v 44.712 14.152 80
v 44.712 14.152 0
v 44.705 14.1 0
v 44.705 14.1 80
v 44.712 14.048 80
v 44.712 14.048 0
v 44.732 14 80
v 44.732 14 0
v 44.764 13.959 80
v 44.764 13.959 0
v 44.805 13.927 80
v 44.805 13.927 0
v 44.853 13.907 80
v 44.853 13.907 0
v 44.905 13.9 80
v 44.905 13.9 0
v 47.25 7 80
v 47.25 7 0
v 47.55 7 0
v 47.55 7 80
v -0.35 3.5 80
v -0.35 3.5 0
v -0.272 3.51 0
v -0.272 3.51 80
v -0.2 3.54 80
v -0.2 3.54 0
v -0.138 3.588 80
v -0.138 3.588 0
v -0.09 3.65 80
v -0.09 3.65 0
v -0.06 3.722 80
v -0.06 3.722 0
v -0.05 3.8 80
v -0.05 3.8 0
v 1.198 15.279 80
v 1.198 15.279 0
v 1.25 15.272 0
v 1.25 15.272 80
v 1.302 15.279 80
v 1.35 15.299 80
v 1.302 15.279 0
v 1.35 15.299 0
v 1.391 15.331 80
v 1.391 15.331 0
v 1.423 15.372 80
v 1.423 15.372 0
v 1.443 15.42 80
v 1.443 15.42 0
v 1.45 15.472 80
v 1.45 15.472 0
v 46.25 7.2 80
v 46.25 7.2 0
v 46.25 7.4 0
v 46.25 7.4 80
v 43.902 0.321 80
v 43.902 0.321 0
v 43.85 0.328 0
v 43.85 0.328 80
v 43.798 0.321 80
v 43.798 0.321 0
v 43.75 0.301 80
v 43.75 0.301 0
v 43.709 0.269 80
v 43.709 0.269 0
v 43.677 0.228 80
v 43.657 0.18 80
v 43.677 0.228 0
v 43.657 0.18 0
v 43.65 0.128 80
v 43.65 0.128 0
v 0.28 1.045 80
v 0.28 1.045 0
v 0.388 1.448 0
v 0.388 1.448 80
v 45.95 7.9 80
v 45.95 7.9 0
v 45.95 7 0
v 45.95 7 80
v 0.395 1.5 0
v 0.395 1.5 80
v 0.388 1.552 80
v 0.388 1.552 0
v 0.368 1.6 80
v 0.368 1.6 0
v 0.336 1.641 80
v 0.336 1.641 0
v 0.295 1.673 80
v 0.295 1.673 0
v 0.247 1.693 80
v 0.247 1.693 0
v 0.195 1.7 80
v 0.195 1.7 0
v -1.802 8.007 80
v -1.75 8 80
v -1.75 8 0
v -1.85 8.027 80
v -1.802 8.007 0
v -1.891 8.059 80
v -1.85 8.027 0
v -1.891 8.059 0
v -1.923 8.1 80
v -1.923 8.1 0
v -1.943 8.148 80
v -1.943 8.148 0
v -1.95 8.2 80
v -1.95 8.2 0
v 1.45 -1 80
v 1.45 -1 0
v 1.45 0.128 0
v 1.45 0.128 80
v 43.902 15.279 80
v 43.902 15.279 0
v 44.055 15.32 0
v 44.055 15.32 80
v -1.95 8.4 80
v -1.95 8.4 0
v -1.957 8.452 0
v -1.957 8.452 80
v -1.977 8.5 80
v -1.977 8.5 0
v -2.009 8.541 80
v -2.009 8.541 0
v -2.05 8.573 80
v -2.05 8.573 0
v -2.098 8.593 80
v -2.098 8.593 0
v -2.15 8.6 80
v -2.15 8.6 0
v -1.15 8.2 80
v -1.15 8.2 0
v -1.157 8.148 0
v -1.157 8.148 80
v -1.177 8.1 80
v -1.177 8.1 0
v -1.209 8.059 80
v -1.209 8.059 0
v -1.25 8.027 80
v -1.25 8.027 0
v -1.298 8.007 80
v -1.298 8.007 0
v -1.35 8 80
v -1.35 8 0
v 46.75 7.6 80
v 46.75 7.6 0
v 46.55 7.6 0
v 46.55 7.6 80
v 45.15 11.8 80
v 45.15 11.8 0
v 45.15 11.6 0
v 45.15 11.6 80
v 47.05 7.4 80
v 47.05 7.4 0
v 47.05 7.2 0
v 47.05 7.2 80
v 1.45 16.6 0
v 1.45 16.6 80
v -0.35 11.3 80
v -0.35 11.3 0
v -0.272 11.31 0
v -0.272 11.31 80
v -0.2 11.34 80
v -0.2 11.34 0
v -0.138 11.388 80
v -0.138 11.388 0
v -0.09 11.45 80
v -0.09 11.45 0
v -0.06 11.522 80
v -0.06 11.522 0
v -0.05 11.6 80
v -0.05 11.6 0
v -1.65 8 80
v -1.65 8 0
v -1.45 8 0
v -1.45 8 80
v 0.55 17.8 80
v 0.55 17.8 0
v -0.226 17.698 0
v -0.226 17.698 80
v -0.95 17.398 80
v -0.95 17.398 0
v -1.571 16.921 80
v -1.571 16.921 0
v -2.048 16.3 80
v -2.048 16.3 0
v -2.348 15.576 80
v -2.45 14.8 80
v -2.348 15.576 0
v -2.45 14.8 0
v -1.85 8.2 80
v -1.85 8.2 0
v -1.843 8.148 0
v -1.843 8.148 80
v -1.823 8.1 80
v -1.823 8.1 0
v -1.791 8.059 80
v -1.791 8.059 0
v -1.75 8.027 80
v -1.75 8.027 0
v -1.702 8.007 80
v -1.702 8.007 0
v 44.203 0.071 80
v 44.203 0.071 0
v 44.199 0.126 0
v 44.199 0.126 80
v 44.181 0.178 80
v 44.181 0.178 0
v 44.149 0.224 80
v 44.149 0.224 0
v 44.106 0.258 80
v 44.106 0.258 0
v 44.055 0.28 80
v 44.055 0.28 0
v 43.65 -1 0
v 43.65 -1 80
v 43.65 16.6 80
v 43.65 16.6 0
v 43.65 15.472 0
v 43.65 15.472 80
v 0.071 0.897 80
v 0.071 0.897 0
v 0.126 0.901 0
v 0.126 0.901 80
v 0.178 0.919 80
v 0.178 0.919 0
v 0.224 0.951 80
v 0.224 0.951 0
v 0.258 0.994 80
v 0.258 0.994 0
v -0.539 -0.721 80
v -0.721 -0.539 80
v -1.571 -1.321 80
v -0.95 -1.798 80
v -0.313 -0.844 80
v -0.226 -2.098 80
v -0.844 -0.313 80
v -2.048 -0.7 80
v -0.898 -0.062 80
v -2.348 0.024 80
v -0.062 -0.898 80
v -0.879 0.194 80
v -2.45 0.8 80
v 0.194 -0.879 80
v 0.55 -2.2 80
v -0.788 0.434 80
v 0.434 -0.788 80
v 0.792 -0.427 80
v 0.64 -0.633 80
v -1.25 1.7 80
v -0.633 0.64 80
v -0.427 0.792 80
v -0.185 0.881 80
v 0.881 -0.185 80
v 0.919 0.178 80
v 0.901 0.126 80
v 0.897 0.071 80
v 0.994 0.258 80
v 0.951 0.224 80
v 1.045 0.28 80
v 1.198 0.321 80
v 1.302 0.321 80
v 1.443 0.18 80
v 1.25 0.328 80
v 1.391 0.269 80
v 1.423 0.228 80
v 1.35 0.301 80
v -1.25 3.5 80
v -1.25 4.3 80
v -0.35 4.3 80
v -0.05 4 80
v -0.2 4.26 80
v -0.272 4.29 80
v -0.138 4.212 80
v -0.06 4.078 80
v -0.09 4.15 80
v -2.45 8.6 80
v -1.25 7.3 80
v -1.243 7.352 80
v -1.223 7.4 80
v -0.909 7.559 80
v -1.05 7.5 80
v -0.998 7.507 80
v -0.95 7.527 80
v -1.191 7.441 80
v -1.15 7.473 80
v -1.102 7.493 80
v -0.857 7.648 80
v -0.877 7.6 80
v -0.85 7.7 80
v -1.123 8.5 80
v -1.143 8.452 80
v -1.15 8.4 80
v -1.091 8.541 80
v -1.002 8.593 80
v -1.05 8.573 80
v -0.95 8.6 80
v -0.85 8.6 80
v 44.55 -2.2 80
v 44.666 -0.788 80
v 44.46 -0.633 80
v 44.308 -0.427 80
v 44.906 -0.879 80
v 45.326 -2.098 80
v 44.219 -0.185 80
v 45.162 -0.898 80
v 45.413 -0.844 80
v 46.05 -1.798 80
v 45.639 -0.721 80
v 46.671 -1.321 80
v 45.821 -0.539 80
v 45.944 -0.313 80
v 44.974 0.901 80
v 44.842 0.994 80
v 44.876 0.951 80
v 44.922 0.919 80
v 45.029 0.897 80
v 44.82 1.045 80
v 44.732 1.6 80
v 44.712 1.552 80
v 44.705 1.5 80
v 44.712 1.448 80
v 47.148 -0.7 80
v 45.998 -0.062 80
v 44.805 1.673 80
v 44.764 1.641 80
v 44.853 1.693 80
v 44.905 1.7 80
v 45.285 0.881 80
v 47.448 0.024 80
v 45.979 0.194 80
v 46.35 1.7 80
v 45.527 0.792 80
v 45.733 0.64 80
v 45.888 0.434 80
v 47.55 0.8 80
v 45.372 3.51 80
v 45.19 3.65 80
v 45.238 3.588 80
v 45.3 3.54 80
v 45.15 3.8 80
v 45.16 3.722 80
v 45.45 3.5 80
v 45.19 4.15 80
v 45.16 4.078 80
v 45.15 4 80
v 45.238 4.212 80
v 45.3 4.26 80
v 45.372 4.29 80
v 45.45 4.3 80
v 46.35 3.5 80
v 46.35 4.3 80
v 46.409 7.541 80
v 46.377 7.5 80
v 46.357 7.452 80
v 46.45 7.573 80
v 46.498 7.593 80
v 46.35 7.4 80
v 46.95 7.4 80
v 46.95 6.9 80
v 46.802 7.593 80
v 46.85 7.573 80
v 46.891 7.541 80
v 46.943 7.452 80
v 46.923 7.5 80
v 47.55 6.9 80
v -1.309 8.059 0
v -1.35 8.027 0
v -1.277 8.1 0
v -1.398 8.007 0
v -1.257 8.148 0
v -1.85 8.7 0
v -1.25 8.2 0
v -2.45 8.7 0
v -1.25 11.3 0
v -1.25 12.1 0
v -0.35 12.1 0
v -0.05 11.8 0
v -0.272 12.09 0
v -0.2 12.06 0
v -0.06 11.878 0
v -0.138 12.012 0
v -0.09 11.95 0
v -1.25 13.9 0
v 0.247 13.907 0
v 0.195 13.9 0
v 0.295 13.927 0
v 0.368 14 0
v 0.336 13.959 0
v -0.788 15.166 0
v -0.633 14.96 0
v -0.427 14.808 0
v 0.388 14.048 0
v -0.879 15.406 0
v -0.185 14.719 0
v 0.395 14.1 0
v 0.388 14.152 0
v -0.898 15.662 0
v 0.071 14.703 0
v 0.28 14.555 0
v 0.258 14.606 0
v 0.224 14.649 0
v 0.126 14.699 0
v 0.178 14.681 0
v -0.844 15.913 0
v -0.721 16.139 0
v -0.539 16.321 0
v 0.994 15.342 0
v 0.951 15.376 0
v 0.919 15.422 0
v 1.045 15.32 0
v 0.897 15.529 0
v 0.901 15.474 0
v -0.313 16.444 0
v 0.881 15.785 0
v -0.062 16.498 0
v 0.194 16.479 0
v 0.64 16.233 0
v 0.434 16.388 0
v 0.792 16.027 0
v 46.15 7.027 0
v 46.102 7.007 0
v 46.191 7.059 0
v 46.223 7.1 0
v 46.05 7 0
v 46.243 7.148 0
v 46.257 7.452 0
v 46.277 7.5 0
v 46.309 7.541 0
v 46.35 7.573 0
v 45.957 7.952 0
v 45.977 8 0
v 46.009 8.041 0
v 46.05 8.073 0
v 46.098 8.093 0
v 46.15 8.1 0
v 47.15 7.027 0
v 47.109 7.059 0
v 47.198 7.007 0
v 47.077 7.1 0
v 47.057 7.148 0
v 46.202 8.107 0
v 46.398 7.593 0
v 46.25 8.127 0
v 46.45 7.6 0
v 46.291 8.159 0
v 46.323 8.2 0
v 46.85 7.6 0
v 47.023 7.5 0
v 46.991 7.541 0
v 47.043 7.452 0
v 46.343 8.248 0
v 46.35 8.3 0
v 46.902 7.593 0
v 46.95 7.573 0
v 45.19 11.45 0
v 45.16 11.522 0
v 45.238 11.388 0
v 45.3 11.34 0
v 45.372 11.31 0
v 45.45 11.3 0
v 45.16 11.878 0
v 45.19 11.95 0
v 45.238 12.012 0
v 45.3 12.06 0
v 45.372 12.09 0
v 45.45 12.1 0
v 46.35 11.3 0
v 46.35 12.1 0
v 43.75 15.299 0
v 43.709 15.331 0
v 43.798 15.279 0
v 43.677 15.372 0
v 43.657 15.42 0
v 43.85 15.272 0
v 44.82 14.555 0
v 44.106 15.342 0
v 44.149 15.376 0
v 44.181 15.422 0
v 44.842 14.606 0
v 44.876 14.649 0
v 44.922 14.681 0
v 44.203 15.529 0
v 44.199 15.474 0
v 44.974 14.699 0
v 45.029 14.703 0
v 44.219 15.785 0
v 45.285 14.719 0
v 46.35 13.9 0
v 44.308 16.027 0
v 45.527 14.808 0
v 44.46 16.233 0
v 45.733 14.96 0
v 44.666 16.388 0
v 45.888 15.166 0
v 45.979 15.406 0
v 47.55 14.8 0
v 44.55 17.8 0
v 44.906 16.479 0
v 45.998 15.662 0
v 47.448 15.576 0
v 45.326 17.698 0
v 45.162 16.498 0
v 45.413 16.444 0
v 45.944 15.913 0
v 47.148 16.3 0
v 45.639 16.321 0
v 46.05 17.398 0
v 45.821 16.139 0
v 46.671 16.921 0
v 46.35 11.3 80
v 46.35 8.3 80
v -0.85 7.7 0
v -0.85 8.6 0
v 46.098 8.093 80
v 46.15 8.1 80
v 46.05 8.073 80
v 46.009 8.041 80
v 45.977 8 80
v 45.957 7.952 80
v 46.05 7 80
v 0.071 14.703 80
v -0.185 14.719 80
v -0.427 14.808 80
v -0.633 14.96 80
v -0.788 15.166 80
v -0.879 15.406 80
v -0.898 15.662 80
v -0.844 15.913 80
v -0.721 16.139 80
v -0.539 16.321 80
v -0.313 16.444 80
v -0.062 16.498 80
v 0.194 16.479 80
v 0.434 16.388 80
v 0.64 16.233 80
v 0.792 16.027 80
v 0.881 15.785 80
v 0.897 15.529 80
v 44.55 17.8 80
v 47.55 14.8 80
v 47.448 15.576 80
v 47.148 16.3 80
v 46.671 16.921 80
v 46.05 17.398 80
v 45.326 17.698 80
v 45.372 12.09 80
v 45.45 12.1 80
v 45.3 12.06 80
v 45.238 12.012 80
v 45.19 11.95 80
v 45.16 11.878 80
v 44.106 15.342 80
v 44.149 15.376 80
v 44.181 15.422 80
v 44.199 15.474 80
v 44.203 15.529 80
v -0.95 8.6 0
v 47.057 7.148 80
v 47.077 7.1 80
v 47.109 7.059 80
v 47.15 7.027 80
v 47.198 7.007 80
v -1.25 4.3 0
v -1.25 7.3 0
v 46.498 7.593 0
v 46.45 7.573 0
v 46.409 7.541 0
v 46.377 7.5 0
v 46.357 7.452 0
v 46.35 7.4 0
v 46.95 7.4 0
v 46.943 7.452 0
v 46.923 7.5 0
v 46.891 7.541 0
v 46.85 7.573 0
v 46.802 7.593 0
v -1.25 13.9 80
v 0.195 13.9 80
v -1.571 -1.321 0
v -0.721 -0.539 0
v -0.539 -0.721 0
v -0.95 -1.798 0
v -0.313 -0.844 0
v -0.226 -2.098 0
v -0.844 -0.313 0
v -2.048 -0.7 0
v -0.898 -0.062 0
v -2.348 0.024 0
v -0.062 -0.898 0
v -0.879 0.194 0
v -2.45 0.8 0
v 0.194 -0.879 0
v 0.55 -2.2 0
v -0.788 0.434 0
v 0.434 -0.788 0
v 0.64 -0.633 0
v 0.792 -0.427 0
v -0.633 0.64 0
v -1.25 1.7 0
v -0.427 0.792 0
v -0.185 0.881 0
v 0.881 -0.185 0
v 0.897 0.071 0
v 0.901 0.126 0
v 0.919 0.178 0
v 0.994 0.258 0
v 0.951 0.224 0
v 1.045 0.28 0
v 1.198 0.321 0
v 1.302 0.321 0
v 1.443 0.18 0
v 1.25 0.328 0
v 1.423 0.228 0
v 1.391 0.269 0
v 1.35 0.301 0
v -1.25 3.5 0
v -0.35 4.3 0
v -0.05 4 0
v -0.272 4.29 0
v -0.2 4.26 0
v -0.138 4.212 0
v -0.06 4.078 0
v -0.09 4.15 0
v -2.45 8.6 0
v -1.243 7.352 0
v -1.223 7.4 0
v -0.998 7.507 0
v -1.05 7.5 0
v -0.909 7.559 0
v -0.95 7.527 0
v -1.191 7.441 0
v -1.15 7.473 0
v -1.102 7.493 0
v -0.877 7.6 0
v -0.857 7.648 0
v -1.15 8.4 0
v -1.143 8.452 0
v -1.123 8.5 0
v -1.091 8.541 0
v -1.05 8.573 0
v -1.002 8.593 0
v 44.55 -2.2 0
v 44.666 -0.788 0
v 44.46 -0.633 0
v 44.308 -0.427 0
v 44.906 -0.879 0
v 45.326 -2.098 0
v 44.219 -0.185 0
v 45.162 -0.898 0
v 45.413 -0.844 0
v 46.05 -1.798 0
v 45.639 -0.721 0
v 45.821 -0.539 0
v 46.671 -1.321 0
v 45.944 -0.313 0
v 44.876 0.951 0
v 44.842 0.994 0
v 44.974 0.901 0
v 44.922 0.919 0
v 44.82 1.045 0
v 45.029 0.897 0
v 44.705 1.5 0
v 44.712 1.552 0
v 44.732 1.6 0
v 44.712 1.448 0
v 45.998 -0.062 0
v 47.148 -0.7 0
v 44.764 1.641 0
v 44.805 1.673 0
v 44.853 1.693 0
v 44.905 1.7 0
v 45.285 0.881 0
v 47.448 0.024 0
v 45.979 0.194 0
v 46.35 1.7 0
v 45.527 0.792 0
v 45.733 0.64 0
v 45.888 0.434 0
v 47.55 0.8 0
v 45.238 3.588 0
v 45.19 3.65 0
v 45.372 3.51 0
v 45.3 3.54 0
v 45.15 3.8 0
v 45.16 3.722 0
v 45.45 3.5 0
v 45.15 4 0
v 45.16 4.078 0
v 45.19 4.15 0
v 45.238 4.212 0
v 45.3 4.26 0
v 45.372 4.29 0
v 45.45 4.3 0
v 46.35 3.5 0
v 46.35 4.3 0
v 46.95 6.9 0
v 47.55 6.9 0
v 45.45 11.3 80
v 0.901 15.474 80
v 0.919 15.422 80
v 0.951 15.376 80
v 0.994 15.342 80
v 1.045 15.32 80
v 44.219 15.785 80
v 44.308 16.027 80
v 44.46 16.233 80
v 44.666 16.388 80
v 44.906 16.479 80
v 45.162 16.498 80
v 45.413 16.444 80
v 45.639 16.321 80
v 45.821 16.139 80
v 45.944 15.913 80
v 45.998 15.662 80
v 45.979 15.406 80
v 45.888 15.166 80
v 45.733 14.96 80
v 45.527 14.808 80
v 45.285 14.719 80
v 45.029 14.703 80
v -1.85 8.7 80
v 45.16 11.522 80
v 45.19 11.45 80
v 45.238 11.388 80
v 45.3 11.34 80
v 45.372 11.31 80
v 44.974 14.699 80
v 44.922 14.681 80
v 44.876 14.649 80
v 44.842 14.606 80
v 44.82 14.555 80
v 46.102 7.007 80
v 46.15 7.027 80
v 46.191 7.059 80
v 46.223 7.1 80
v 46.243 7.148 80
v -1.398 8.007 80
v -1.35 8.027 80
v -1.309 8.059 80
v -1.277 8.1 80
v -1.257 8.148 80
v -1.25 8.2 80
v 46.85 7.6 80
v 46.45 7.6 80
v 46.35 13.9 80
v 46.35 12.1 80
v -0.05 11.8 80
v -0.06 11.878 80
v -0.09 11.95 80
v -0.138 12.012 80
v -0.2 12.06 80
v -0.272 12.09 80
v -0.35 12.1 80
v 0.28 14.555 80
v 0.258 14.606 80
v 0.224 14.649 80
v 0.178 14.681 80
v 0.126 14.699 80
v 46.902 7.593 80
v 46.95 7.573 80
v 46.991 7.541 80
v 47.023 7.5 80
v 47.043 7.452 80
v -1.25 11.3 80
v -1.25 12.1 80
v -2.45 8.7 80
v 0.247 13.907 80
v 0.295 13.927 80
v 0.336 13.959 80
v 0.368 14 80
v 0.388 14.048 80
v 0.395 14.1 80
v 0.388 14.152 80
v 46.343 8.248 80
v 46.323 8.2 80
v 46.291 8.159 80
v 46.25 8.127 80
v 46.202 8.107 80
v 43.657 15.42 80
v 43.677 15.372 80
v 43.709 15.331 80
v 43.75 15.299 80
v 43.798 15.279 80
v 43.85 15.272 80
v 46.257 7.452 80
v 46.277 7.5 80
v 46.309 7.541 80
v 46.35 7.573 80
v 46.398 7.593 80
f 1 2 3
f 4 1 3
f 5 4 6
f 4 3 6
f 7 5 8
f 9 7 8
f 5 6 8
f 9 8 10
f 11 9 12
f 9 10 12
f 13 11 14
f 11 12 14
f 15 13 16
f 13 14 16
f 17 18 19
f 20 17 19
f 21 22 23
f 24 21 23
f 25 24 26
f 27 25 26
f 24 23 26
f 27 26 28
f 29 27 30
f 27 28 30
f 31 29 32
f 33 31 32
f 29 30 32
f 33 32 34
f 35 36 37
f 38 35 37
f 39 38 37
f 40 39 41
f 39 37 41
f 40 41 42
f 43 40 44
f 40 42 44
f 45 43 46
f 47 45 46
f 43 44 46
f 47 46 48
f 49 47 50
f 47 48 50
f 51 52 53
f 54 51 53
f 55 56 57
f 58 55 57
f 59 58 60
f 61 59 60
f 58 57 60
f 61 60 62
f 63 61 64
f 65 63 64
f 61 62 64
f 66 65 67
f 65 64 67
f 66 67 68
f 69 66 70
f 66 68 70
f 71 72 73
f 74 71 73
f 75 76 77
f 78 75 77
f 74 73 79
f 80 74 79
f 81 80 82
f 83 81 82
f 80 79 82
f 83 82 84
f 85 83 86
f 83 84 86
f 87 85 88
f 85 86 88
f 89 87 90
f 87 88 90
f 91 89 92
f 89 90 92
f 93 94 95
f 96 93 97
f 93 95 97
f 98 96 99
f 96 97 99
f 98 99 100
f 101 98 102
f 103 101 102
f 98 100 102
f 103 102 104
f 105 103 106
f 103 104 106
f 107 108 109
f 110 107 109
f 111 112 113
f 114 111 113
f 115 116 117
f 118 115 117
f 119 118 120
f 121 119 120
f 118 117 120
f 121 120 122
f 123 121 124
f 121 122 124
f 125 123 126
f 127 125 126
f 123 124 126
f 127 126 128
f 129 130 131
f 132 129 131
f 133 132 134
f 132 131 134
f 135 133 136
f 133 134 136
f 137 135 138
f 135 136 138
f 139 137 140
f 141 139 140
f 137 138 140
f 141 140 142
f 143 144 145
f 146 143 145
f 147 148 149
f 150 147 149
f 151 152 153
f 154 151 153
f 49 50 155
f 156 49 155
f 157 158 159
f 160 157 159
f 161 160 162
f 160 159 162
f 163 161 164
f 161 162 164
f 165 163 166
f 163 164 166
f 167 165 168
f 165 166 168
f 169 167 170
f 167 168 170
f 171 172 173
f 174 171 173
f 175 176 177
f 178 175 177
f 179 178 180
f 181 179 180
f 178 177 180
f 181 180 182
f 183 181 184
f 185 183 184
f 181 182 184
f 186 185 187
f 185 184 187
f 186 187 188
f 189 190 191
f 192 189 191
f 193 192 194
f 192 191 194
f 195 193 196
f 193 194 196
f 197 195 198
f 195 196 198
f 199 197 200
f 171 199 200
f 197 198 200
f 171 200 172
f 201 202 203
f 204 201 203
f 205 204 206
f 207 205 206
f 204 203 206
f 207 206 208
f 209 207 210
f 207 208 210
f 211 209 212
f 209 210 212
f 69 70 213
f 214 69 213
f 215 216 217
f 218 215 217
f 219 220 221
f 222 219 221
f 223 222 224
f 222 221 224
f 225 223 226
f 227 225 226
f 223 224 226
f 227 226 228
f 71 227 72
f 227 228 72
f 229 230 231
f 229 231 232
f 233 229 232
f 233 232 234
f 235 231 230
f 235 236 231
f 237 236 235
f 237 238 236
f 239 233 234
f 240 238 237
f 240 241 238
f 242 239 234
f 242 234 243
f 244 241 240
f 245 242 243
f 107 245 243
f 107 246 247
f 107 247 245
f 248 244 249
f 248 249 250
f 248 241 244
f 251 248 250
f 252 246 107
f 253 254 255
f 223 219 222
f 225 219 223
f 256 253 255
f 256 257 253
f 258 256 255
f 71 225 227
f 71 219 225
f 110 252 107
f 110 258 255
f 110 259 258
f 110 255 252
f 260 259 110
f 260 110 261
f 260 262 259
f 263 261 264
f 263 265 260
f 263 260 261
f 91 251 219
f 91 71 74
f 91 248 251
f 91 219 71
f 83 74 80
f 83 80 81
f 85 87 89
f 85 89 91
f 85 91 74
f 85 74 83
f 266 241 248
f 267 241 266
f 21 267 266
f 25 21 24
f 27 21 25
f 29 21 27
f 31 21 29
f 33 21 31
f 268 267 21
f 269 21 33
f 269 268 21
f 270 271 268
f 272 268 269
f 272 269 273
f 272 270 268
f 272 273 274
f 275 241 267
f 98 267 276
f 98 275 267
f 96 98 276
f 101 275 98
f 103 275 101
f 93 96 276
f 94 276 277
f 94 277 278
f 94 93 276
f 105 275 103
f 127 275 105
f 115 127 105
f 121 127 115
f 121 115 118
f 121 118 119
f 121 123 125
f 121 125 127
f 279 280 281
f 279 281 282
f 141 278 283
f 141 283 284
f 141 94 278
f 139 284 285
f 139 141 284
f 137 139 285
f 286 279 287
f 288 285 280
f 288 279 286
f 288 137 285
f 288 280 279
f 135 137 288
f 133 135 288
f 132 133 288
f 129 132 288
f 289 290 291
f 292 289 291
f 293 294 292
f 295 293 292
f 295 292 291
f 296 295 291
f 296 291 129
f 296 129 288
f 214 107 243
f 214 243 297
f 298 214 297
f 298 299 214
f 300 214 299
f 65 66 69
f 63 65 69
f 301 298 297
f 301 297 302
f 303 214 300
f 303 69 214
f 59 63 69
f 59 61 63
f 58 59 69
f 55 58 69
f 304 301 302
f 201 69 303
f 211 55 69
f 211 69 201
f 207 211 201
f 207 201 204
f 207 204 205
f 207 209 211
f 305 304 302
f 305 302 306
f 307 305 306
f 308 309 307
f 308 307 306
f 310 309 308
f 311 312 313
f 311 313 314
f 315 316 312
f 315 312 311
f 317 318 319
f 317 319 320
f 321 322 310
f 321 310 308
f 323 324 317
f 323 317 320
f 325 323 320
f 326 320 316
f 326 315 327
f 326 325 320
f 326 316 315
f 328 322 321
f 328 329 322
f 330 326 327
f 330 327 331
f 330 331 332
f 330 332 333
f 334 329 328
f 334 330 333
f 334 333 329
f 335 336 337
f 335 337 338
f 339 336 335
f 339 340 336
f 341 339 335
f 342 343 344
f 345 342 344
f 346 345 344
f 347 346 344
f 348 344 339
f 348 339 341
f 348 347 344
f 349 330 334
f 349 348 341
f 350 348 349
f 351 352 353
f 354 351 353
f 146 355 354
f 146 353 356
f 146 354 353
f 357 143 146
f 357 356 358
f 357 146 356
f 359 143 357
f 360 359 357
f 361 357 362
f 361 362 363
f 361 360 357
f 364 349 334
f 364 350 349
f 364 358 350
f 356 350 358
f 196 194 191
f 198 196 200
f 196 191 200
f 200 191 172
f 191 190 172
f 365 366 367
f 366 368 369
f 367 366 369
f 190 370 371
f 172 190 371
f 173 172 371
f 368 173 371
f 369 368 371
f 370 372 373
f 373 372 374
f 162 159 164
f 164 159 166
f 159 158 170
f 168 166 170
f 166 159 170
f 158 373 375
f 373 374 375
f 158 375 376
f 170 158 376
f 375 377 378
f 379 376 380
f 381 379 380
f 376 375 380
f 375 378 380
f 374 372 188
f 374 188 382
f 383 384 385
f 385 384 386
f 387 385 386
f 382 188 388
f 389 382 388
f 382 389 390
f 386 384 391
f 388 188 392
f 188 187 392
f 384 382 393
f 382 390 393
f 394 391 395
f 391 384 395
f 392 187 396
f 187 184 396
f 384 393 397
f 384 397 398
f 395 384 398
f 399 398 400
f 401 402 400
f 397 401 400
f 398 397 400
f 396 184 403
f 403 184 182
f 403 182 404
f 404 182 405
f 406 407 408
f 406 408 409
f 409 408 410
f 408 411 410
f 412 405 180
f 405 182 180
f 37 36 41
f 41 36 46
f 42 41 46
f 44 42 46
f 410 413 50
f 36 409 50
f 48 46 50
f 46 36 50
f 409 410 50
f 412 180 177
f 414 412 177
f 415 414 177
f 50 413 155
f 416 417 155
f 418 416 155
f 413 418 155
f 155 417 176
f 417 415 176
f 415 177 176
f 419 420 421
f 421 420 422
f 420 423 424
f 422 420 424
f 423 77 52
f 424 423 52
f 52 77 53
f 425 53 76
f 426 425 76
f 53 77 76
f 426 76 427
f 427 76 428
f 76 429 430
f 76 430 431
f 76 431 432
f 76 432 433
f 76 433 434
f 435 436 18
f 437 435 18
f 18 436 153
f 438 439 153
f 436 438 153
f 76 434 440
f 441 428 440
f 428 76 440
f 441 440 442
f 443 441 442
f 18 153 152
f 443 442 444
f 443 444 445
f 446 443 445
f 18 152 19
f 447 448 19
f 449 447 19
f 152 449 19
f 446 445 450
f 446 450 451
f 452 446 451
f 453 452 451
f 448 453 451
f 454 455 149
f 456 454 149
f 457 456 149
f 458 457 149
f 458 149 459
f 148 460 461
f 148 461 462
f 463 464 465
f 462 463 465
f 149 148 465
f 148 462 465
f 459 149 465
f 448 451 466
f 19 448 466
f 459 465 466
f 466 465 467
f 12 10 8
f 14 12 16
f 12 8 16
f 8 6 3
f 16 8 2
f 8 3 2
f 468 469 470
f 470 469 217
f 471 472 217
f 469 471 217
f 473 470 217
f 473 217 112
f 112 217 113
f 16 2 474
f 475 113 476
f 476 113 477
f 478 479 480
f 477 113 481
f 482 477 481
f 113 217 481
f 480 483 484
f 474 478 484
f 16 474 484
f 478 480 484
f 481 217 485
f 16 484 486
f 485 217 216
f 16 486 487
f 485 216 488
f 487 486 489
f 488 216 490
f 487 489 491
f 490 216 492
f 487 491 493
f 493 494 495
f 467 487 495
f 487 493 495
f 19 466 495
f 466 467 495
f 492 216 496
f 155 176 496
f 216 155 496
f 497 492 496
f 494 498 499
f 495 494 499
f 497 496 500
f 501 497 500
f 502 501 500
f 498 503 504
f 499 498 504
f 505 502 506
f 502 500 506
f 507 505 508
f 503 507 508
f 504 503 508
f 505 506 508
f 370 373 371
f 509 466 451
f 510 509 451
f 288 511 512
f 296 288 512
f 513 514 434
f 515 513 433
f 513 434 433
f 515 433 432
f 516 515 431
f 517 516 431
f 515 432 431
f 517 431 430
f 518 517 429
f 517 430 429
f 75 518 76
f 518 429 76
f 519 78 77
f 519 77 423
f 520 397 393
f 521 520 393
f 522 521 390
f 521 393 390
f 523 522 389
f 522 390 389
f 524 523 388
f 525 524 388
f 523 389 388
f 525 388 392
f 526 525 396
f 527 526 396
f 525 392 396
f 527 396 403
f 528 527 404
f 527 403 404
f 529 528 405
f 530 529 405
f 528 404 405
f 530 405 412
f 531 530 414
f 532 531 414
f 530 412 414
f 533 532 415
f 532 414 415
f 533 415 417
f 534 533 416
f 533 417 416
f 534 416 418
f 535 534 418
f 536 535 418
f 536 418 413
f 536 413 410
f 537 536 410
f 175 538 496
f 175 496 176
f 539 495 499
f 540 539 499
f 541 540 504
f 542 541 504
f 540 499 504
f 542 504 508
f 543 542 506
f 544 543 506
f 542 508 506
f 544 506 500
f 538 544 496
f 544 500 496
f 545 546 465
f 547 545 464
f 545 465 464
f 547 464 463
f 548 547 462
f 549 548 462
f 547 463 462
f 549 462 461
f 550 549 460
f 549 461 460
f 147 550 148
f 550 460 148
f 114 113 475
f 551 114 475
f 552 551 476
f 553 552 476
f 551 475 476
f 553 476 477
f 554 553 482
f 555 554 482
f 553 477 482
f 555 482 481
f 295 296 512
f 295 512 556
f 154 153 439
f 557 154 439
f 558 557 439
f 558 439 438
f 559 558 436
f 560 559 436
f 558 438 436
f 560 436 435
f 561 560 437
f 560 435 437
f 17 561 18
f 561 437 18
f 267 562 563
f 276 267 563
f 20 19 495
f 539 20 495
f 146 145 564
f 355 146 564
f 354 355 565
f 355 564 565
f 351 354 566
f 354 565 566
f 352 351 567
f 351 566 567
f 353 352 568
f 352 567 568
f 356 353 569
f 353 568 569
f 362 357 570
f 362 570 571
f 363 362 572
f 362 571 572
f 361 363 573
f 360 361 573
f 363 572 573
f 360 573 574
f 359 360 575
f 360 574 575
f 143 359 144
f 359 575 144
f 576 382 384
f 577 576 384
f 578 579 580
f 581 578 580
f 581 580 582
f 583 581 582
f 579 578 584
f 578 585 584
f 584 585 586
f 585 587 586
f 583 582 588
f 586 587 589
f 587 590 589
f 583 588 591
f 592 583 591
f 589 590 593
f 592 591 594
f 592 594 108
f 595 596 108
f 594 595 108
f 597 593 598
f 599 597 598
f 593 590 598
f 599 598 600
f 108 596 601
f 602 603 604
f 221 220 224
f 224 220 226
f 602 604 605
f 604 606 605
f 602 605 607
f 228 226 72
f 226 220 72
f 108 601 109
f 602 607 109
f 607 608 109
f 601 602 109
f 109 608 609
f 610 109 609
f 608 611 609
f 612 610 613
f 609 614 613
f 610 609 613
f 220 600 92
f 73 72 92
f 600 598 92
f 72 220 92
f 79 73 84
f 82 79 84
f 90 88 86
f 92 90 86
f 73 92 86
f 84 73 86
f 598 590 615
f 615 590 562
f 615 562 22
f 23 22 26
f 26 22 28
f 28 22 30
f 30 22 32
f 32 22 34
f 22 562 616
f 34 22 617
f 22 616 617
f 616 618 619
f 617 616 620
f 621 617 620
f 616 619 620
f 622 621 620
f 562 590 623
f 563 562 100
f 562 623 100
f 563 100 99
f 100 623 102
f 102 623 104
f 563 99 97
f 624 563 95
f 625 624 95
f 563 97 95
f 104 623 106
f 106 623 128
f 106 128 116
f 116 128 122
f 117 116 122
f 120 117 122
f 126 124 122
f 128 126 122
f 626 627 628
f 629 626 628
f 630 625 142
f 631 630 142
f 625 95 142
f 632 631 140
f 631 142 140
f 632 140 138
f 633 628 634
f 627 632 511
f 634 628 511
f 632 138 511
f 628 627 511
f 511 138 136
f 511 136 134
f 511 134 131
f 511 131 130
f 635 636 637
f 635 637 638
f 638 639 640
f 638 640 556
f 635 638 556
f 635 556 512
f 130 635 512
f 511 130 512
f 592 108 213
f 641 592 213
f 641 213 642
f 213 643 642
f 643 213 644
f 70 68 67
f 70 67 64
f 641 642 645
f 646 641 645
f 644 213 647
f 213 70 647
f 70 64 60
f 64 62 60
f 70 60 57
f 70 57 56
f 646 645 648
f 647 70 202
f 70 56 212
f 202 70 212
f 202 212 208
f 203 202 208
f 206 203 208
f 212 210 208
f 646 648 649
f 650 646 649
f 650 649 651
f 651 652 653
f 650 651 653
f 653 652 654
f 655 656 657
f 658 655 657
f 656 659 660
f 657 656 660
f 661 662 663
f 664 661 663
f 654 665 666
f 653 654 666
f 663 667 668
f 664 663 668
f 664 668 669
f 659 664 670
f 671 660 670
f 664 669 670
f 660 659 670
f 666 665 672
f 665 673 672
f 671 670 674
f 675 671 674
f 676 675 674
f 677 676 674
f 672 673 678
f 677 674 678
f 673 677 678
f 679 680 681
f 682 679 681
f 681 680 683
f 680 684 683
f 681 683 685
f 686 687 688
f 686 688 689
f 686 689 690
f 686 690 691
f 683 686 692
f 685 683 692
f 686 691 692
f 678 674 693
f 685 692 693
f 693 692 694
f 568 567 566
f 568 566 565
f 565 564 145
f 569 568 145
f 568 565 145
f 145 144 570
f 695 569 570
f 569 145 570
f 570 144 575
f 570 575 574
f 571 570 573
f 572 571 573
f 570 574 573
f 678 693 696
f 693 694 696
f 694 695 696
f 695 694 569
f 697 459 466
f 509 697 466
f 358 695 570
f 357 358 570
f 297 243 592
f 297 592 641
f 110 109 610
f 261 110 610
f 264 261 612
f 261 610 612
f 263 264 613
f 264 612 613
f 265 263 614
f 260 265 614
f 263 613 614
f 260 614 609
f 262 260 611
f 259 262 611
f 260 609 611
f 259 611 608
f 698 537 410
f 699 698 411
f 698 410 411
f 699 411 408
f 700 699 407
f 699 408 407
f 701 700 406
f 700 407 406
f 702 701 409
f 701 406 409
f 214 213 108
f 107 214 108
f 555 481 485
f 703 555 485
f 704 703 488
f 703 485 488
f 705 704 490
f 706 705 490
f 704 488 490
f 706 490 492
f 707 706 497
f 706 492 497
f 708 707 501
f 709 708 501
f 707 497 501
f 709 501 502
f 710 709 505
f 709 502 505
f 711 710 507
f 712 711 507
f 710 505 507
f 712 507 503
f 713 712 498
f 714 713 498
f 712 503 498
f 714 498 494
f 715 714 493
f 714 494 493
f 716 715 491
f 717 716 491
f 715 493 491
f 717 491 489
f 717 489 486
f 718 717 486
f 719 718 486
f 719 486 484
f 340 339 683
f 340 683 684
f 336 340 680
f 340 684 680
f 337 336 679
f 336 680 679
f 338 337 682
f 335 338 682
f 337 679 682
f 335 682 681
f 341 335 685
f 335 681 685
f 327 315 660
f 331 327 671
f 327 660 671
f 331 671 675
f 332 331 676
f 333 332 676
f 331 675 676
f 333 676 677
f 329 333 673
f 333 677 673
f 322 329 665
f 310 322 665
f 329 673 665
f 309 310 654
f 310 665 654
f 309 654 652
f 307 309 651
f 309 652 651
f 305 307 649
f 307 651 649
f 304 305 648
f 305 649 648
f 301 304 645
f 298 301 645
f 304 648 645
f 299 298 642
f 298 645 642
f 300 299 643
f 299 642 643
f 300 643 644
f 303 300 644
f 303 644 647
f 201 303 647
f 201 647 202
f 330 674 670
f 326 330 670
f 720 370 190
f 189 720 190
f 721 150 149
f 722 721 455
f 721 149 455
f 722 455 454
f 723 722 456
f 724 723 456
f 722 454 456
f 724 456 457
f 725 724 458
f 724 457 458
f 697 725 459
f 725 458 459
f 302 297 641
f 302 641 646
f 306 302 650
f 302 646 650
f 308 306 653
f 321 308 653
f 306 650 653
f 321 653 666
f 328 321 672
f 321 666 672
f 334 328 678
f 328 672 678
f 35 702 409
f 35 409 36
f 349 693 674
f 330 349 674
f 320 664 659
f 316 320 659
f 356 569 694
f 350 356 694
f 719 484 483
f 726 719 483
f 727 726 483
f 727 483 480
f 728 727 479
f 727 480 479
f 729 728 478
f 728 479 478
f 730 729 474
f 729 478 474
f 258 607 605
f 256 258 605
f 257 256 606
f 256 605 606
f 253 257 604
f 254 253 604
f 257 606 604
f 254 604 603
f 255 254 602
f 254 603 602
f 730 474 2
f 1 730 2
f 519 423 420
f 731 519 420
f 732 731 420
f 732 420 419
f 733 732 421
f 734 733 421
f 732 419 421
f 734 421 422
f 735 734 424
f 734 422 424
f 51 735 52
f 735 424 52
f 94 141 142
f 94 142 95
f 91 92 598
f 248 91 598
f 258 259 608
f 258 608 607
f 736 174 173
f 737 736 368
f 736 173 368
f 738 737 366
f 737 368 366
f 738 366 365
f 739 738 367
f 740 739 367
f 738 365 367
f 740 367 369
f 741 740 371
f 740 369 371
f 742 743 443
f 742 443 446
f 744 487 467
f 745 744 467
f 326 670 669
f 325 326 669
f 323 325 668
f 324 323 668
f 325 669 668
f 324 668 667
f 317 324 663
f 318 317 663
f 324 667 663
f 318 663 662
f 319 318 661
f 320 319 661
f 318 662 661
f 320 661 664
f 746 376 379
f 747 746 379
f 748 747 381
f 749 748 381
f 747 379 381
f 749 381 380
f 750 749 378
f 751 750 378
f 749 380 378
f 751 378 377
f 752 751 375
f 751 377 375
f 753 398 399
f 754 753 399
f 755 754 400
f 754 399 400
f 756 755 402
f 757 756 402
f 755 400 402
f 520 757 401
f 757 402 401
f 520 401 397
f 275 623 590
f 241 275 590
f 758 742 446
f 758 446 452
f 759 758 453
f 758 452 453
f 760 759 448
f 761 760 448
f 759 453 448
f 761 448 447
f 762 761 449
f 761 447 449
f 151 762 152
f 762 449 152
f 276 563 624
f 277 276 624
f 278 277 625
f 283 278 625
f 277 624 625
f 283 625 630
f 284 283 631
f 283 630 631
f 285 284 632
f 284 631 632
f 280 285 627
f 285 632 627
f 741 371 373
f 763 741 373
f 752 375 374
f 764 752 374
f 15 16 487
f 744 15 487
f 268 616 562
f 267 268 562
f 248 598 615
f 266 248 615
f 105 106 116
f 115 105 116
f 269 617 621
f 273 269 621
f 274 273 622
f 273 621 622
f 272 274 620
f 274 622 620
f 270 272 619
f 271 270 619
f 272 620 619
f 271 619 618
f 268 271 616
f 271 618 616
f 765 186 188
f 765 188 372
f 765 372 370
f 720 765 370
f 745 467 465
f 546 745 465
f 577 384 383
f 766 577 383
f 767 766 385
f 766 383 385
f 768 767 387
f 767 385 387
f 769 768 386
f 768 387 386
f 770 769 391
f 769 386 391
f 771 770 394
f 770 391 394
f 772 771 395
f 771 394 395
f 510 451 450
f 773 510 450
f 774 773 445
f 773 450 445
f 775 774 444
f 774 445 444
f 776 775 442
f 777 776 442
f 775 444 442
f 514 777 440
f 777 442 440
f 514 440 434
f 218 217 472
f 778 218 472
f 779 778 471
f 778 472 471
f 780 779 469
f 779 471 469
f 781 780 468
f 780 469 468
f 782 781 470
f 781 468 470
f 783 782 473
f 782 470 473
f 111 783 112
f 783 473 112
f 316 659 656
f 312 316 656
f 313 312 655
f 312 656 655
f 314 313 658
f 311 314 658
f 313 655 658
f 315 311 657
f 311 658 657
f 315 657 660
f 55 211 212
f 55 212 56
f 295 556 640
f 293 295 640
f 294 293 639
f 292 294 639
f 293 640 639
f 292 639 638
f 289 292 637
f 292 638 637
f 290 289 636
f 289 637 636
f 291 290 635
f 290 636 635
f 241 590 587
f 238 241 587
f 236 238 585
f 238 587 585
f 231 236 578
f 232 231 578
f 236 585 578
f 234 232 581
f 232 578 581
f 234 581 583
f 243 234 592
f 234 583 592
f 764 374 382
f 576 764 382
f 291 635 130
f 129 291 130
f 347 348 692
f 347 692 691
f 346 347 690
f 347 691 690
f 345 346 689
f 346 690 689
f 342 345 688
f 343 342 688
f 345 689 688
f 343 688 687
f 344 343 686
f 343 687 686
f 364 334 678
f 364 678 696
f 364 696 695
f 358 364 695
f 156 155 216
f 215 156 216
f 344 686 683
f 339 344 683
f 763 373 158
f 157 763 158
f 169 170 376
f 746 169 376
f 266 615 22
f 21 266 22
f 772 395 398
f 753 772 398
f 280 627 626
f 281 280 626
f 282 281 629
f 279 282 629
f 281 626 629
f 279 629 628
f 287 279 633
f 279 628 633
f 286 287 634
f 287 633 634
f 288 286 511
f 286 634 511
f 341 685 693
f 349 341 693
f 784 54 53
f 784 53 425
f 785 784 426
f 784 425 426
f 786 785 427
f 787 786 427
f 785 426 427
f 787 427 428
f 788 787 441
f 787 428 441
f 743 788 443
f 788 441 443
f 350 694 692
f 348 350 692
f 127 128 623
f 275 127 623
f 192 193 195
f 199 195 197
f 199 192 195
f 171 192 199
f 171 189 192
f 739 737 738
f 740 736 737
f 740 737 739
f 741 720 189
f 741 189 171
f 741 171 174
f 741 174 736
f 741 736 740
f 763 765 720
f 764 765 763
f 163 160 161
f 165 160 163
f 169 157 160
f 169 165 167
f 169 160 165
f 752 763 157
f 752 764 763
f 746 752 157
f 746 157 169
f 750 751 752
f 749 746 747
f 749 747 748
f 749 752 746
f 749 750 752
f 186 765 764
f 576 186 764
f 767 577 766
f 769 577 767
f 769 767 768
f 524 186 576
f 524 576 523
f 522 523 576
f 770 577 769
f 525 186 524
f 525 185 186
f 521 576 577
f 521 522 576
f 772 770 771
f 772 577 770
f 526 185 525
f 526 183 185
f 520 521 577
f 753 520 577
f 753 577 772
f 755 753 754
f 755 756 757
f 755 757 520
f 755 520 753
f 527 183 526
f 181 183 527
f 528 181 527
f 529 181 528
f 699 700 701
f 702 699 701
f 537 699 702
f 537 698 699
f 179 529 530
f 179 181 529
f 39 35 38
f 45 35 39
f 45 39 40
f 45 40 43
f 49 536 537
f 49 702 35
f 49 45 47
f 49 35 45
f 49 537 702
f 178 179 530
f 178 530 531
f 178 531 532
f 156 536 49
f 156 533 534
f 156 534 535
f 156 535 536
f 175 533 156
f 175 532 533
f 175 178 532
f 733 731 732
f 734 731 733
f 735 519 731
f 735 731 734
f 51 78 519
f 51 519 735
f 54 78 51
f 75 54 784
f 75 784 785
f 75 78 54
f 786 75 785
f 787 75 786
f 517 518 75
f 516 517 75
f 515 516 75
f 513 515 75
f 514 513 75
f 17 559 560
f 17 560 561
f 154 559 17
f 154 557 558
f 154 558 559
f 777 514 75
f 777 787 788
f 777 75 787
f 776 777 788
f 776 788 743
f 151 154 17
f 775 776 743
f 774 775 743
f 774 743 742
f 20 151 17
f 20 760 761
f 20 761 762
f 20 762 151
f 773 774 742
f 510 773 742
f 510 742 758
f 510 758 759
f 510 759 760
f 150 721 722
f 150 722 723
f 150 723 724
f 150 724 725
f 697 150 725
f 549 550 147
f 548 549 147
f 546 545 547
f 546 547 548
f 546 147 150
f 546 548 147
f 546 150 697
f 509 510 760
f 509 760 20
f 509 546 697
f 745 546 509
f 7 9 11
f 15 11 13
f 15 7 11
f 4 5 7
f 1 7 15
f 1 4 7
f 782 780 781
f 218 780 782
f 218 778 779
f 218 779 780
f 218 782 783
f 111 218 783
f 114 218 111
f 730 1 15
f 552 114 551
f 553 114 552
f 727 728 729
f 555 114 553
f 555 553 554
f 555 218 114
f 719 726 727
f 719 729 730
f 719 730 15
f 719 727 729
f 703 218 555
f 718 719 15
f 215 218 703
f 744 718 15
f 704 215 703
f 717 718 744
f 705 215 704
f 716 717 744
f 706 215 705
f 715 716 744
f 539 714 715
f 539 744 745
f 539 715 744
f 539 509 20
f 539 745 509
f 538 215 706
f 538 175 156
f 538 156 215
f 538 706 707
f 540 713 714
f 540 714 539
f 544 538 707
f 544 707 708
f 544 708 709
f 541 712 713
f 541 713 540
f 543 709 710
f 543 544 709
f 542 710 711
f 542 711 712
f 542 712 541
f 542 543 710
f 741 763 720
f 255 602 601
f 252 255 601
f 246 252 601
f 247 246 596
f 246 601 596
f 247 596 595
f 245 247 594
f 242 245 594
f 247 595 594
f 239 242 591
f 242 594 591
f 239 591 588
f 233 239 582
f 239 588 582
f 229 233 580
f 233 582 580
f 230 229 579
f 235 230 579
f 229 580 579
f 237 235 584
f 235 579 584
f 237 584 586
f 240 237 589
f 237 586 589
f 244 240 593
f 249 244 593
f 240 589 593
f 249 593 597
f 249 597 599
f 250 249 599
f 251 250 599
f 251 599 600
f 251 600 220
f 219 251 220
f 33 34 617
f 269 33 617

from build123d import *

# Parameters (mm, degrees)
EXTRUDE_1_DEPTH = 80
EXTRUDE_2_DEPTH = 80


with BuildPart() as part:
    # 草图5 → 凸台-拉伸1 (new body)
    with BuildSketch(Plane.XY):
        with BuildLine():
            Line((-2.45, 14.8), (-2.45, 8.7))
            Line((-2.45, 8.7), (-1.85, 8.7))
            Line((-1.85, 8.7), (-1.85, 8.2))
            ThreePointArc((-1.85, 8.2), (-1.791421356, 8.058578644), (-1.65, 8))
            Line((-1.65, 8), (-1.45, 8))
            ThreePointArc((-1.45, 8), (-1.308578644, 8.058578644), (-1.25, 8.2))
            Line((-1.25, 8.2), (-1.25, 11.3))
            Line((-1.25, 11.3), (-0.35, 11.3))
            ThreePointArc((-0.35, 11.3), (-0.137867966, 11.387867966), (-0.05, 11.6))
            Line((-0.05, 11.6), (-0.05, 11.8))
            ThreePointArc((-0.05, 11.8), (-0.137867966, 12.012132034), (-0.35, 12.1))
            Line((-0.35, 12.1), (-1.25, 12.1))
            Line((-1.25, 12.1), (-1.25, 13.9))
            Line((-1.25, 13.9), (0.194868553, 13.9))
            ThreePointArc((0.194868553, 13.9), (0.353539221, 13.978247714), (0.388053718, 14.151763809))
            Line((0.388053718, 14.151763809), (0.279955601, 14.555191472))
            ThreePointArc((0.279955601, 14.555191472), (0.202164811, 14.666780466), (0.070993993, 14.702804451))
            ThreePointArc((0.070993993, 14.702804451), (-0.636396103, 16.236396103), (0.897195549, 15.529006007))
            ThreePointArc((0.897195549, 15.529006007), (0.933219534, 15.397835189), (1.044808528, 15.320044399))
            Line((1.044808528, 15.320044399), (1.198236191, 15.27893358))
            ThreePointArc((1.198236191, 15.27893358), (1.371752286, 15.313448077), (1.45, 15.472118746))
            Line((1.45, 15.472118746), (1.45, 16.6))
            Line((1.45, 16.6), (43.65, 16.6))
            Line((43.65, 16.6), (43.65, 15.472118746))
            ThreePointArc((43.65, 15.472118746), (43.728247714, 15.313448077), (43.901763809, 15.27893358))
            Line((43.901763809, 15.27893358), (44.055191471, 15.320044399))
            ThreePointArc((44.055191471, 15.320044399), (44.166780466, 15.397835189), (44.202804451, 15.529006007))
            ThreePointArc((44.202804451, 15.529006007), (45.736396103, 16.236396103), (45.029006007, 14.702804451))
            ThreePointArc((45.029006007, 14.702804451), (44.897835189, 14.666780466), (44.820044399, 14.555191472))
            Line((44.820044399, 14.555191472), (44.711946282, 14.151763809))
            ThreePointArc((44.711946282, 14.151763809), (44.746460779, 13.978247714), (44.905131447, 13.9))
            Line((44.905131447, 13.9), (46.35, 13.9))
            Line((46.35, 13.9), (46.35, 12.1))
            Line((46.35, 12.1), (45.45, 12.1))
            ThreePointArc((45.45, 12.1), (45.237867966, 12.012132034), (45.15, 11.8))
            Line((45.15, 11.8), (45.15, 11.6))
            ThreePointArc((45.15, 11.6), (45.237867966, 11.387867966), (45.45, 11.3))
            Line((45.45, 11.3), (46.35, 11.3))
            Line((46.35, 11.3), (46.35, 8.3))
            ThreePointArc((46.35, 8.3), (46.291421356, 8.158578644), (46.15, 8.1))
            ThreePointArc((46.15, 8.1), (46.008578644, 8.041421356), (45.95, 7.9))
            Line((45.95, 7.9), (45.95, 7))
            Line((45.95, 7), (46.05, 7))
            ThreePointArc((46.05, 7), (46.191421356, 7.058578644), (46.25, 7.2))
            Line((46.25, 7.2), (46.25, 7.4))
            ThreePointArc((46.25, 7.4), (46.308578644, 7.541421356), (46.45, 7.6))
            Line((46.45, 7.6), (46.85, 7.6))
            ThreePointArc((46.85, 7.6), (46.991421356, 7.541421356), (47.05, 7.4))
            Line((47.05, 7.4), (47.05, 7.2))
            ThreePointArc((47.05, 7.2), (47.108578644, 7.058578644), (47.25, 7))
            Line((47.25, 7), (47.55, 7))
            Line((47.55, 7), (47.55, 14.8))
            ThreePointArc((47.55, 14.8), (46.671320344, 16.921320344), (44.55, 17.8))
            Line((44.55, 17.8), (0.55, 17.8))
            ThreePointArc((0.55, 17.8), (-1.571320344, 16.921320344), (-2.45, 14.8))
        make_face()
    extrude(amount=EXTRUDE_1_DEPTH)


with BuildPart() as body_2:
    # 草图5<3> → 凸台-拉伸2 (new body)
    with BuildSketch(Plane.XY):
        with BuildLine():
            Line((47.55, 0.8), (47.55, 6.9))
            Line((47.55, 6.9), (46.95, 6.9))
            Line((46.95, 6.9), (46.95, 7.4))
            ThreePointArc((46.95, 7.4), (46.891421356, 7.541421356), (46.75, 7.6))
            Line((46.75, 7.6), (46.55, 7.6))
            ThreePointArc((46.55, 7.6), (46.408578644, 7.541421356), (46.35, 7.4))
            Line((46.35, 7.4), (46.35, 4.3))
            Line((46.35, 4.3), (45.45, 4.3))
            ThreePointArc((45.45, 4.3), (45.237867966, 4.212132034), (45.15, 4))
            Line((45.15, 4), (45.15, 3.8))
            ThreePointArc((45.15, 3.8), (45.237867966, 3.587867966), (45.45, 3.5))
            Line((45.45, 3.5), (46.35, 3.5))
            Line((46.35, 3.5), (46.35, 1.7))
            Line((46.35, 1.7), (44.905131447, 1.7))
            ThreePointArc((44.905131447, 1.7), (44.746460779, 1.621752286), (44.711946282, 1.448236191))
            Line((44.711946282, 1.448236191), (44.820044399, 1.044808528))
            ThreePointArc((44.820044399, 1.044808528), (44.897835189, 0.933219534), (45.029006007, 0.897195549))
            ThreePointArc((45.029006007, 0.897195549), (45.736396103, -0.636396103), (44.202804451, 0.070993993))
            ThreePointArc((44.202804451, 0.070993993), (44.166780466, 0.202164811), (44.055191471, 0.279955601))
            Line((44.055191471, 0.279955601), (43.901763809, 0.32106642))
            ThreePointArc((43.901763809, 0.32106642), (43.728247714, 0.286551923), (43.65, 0.127881254))
            Line((43.65, 0.127881254), (43.65, -1))
            Line((43.65, -1), (1.45, -1))
            Line((1.45, -1), (1.45, 0.127881254))
            ThreePointArc((1.45, 0.127881254), (1.371752286, 0.286551923), (1.198236191, 0.32106642))
            Line((1.198236191, 0.32106642), (1.044808528, 0.279955601))
            ThreePointArc((1.044808528, 0.279955601), (0.933219534, 0.202164811), (0.897195549, 0.070993993))
            ThreePointArc((0.897195549, 0.070993993), (-0.636396103, -0.636396103), (0.070993993, 0.897195549))
            ThreePointArc((0.070993993, 0.897195549), (0.202164811, 0.933219534), (0.279955601, 1.044808528))
            Line((0.279955601, 1.044808528), (0.388053718, 1.448236191))
            ThreePointArc((0.388053718, 1.448236191), (0.353539221, 1.621752286), (0.194868553, 1.7))
            Line((0.194868553, 1.7), (-1.25, 1.7))
            Line((-1.25, 1.7), (-1.25, 3.5))
            Line((-1.25, 3.5), (-0.35, 3.5))
            ThreePointArc((-0.35, 3.5), (-0.137867966, 3.587867966), (-0.05, 3.8))
            Line((-0.05, 3.8), (-0.05, 4))
            ThreePointArc((-0.05, 4), (-0.137867966, 4.212132034), (-0.35, 4.3))
            Line((-0.35, 4.3), (-1.25, 4.3))
            Line((-1.25, 4.3), (-1.25, 7.3))
            ThreePointArc((-1.25, 7.3), (-1.191421356, 7.441421356), (-1.05, 7.5))
            ThreePointArc((-1.05, 7.5), (-0.908578644, 7.558578644), (-0.85, 7.7))
            Line((-0.85, 7.7), (-0.85, 8.6))
            Line((-0.85, 8.6), (-0.95, 8.6))
            ThreePointArc((-0.95, 8.6), (-1.091421356, 8.541421356), (-1.15, 8.4))
            Line((-1.15, 8.4), (-1.15, 8.2))
            ThreePointArc((-1.15, 8.2), (-1.208578644, 8.058578644), (-1.35, 8))
            Line((-1.35, 8), (-1.75, 8))
            ThreePointArc((-1.75, 8), (-1.891421356, 8.058578644), (-1.95, 8.2))
            Line((-1.95, 8.2), (-1.95, 8.4))
            ThreePointArc((-1.95, 8.4), (-2.008578644, 8.541421356), (-2.15, 8.6))
            Line((-2.15, 8.6), (-2.45, 8.6))
            Line((-2.45, 8.6), (-2.45, 0.8))
            ThreePointArc((-2.45, 0.8), (-1.571320344, -1.321320344), (0.55, -2.2))
            Line((0.55, -2.2), (44.55, -2.2))
            ThreePointArc((44.55, -2.2), (46.671320344, -1.321320344), (47.55, 0.8))
        make_face()
    extrude(amount=EXTRUDE_2_DEPTH)


solid = Compound([part.part, body_2.part])
